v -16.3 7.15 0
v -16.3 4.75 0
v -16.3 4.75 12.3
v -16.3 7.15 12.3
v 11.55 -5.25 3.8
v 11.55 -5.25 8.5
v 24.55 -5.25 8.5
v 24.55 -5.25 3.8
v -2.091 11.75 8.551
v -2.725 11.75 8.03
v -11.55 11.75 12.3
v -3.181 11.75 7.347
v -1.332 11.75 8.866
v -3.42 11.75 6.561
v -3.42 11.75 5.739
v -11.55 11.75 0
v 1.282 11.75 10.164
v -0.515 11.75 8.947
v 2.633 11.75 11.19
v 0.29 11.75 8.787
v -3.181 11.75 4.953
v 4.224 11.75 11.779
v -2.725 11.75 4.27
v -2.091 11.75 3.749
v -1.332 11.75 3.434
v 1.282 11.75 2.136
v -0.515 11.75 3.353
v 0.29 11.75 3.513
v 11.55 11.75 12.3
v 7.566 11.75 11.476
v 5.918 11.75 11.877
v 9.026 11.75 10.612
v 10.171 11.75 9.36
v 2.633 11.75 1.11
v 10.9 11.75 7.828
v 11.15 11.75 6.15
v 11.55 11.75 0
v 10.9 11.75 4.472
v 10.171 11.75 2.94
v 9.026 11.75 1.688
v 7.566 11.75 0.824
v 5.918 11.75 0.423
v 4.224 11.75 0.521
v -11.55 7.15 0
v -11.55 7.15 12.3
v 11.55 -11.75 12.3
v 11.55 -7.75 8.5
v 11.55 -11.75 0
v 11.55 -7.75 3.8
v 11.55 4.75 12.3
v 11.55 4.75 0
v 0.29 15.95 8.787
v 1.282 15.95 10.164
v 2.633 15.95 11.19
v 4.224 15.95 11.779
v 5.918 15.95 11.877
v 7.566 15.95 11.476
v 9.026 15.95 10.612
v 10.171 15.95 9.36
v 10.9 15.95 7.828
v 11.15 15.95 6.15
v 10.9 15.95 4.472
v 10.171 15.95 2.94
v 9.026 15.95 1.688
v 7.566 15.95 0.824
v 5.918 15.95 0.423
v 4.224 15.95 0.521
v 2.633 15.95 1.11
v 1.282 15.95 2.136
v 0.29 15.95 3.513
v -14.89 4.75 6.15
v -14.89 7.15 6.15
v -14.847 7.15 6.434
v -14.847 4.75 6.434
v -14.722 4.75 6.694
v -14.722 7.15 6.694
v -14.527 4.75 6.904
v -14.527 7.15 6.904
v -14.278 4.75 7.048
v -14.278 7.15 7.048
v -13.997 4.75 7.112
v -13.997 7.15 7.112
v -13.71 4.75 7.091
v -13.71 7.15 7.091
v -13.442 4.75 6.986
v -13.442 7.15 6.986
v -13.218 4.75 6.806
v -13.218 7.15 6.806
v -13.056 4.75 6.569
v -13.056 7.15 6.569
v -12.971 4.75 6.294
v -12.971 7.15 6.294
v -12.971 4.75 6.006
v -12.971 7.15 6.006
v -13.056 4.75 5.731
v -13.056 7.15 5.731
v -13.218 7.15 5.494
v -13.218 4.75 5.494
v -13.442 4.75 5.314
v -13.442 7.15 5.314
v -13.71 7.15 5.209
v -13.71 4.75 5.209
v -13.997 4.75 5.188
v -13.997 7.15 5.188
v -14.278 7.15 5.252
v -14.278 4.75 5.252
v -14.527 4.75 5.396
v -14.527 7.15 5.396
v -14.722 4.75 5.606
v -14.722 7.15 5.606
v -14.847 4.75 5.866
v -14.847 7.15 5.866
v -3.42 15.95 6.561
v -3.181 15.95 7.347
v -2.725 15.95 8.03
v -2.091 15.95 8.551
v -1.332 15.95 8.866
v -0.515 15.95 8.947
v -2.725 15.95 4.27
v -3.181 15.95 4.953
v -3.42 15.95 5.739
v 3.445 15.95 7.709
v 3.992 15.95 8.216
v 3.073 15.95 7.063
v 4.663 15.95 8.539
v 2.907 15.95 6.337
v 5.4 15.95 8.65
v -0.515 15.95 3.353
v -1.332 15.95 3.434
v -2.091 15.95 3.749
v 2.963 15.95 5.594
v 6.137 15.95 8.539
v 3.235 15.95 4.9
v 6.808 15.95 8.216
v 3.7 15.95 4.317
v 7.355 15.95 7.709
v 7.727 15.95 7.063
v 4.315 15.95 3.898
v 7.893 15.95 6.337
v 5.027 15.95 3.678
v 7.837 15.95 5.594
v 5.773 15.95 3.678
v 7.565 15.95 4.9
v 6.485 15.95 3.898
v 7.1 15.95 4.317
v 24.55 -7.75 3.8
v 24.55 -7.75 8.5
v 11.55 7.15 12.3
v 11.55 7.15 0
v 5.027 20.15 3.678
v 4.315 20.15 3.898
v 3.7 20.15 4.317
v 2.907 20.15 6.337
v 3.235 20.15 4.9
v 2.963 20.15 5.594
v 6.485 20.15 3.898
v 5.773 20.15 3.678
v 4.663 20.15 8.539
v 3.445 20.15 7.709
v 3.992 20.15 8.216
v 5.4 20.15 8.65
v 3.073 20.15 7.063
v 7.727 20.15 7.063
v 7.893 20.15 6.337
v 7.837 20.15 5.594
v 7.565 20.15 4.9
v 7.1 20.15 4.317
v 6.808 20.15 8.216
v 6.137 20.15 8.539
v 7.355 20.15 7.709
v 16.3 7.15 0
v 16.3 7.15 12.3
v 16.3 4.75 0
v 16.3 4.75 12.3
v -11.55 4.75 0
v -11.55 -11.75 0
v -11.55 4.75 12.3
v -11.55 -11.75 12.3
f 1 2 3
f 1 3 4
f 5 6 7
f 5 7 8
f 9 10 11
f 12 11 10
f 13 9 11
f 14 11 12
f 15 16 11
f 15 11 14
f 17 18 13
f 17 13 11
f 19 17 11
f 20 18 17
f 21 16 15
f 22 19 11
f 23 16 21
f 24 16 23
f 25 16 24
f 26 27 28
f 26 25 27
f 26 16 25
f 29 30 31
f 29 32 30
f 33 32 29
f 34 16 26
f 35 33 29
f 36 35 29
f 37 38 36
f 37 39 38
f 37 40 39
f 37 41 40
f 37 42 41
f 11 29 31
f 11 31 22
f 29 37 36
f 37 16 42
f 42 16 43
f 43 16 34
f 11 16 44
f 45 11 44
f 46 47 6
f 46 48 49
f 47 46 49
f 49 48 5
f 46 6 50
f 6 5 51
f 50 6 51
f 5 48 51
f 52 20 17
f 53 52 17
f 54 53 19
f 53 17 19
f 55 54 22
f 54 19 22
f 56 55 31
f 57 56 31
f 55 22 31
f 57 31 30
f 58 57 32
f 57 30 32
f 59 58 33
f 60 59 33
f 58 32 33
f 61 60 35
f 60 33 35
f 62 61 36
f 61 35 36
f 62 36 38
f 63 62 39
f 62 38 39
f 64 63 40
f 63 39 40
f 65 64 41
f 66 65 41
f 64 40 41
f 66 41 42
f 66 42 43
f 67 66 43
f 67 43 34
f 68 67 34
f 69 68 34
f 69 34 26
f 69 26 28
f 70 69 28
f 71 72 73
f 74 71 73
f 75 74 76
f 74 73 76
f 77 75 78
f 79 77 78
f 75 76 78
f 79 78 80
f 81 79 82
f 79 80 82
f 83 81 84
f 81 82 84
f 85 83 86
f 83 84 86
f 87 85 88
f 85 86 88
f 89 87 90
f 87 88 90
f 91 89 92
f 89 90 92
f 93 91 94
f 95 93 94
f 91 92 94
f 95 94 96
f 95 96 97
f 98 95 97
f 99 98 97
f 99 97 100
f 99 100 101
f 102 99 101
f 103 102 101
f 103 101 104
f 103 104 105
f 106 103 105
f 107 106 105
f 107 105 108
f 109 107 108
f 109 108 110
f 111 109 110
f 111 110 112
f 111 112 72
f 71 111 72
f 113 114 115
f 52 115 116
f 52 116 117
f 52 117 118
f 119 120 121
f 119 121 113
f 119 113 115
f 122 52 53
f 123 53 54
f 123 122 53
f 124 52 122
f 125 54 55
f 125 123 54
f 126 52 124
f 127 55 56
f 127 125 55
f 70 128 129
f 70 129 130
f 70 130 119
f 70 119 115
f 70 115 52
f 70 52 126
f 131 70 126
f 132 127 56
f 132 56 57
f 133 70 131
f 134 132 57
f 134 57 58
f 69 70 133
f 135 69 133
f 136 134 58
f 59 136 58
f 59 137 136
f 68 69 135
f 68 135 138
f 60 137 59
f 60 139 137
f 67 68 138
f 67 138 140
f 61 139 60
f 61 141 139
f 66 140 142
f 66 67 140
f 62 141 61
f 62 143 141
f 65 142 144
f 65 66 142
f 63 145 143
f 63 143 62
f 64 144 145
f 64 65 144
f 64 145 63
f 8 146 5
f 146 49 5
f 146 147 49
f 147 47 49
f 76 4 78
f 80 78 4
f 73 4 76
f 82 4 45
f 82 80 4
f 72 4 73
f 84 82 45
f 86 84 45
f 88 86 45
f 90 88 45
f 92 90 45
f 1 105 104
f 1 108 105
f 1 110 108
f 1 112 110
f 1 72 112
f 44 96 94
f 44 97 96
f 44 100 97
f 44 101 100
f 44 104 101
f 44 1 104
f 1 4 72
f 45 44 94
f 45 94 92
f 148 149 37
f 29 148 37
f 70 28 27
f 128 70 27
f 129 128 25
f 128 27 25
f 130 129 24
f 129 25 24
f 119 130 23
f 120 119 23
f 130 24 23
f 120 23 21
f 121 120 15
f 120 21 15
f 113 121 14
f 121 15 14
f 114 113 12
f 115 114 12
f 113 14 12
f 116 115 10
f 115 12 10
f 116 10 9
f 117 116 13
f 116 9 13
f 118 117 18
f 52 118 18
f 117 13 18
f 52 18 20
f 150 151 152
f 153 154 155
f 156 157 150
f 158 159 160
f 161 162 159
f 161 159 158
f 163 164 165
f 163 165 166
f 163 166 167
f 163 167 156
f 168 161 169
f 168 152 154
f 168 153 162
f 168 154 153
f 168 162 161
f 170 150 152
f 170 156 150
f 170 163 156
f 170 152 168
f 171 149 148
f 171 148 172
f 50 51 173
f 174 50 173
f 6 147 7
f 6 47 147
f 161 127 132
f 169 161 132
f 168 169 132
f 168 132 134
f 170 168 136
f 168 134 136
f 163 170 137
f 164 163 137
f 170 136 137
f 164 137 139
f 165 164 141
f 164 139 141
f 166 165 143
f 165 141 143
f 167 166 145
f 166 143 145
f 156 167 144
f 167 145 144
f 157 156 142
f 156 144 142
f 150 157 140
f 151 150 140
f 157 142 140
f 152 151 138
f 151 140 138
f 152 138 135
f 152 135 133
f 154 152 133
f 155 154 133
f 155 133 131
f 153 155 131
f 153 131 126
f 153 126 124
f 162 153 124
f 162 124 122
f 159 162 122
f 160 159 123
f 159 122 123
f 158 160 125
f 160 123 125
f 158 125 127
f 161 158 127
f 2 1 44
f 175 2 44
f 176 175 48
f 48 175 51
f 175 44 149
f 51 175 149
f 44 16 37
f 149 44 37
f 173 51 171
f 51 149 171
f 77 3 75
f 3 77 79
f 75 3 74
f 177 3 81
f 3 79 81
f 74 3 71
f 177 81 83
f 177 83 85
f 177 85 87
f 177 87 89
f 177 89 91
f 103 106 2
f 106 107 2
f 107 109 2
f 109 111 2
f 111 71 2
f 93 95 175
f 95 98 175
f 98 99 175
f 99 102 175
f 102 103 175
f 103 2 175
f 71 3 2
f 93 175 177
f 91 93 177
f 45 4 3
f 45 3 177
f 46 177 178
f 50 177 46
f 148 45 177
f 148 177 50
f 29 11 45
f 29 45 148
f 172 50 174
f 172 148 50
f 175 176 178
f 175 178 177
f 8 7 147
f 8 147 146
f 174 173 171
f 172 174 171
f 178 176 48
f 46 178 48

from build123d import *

# Parameters (mm, degrees)
SKETCH_1_W          = 23.1
SKETCH_1_H          = 4.6
SKETCH_1_H_2        = 2.4
SKETCH_1_W_2        = 4.75
SKETCH_1_H_3        = 16.5
EXTRUDE_1_DEPTH     = 12.3
SKETCH_2_R          = 5.75
SKETCH_2_R_2        = 2.8
EXTRUDE_3_DEPTH     = 4.2
SKETCH_4_R          = 2.5
EXTRUDE_4_DEPTH     = 4.2
SKETCH_5_W          = 4.7
SKETCH_5_H          = 2.5
EXTRUDE_5_DEPTH     = 8
SKETCH_6_W          = 4.7
SKETCH_6_H          = 2.5
EXTRUDE_6_DEPTH     = 5
SKETCH_7_R          = 0.965
CUT_EXTRUDE_1_DEPTH = 7


with BuildPart() as part:
    # 草图1 → 凸台-拉伸1 (new body)
    with BuildSketch(Plane.XY):
        with Locations((0, 9.45)):
            Rectangle(SKETCH_1_W, SKETCH_1_H)
        with Locations((0, 5.95)):
            Rectangle(SKETCH_1_W, SKETCH_1_H_2)
        with Locations((-13.925, 5.95)):
            Rectangle(SKETCH_1_W_2, SKETCH_1_H_2)
        with Locations((13.925, 5.95)):
            Rectangle(SKETCH_1_W_2, SKETCH_1_H_2)
        with Locations((0, -3.5)):
            Rectangle(SKETCH_1_W, SKETCH_1_H_3)
    extrude(amount=EXTRUDE_1_DEPTH)

    # 草图2 → 凸台-拉伸3 (add)
    with BuildSketch(Plane(origin=(0, 11.75, 0), x_dir=(1, 0, 0), z_dir=(0, 1, 0))):
        with Locations((5.4, -6.15)):
            Circle(SKETCH_2_R)
        with Locations((-0.65, -6.15)):
            Circle(SKETCH_2_R_2)
        with Locations((-0.65, -6.15)):
            Circle(SKETCH_2_R_2)
        with Locations((5.4, -6.15)):
            Circle(SKETCH_2_R)
        with Locations((5.4, -6.15)):
            Circle(SKETCH_2_R)
        with Locations((-0.65, -6.15)):
            Circle(SKETCH_2_R_2)
    extrude(amount=EXTRUDE_3_DEPTH)

    # 草图4 → 凸台-拉伸4 (add)
    with BuildSketch(Plane(origin=(0, 15.95, 0), x_dir=(1, 0, 0), z_dir=(0, 1, 0))):
        with Locations(Location((5.4, -6.15, 0), (0, 0, 270))):
            Circle(SKETCH_4_R)
    extrude(amount=EXTRUDE_4_DEPTH)

    # 草图5 → 凸台-拉伸5 (add)
    with BuildSketch(Plane(origin=(11.55, 0, 0), x_dir=(0, 0, -1), z_dir=(1, 0, 0))):
        with Locations((-6.15, -6.5)):
            Rectangle(SKETCH_5_W, SKETCH_5_H)
    extrude(amount=EXTRUDE_5_DEPTH)

    # 草图6 → 凸台-拉伸6 (add)
    with BuildSketch(Plane(origin=(19.55, 0, 0), x_dir=(0, 0, -1), z_dir=(1, 0, 0))):
        with Locations((-6.15, -6.5)):
            Rectangle(SKETCH_6_W, SKETCH_6_H)
    extrude(amount=EXTRUDE_6_DEPTH)

    # 草图7 → 切除-拉伸1 (cut)
    with BuildSketch(Plane(origin=(0, 7.15, 0), x_dir=(1, 0, 0), z_dir=(0, 1, 0))):
        with Locations(Location((-13.925, -6.15, 0), (0, 0, 180))):
            Circle(SKETCH_7_R)
    extrude(amount=-CUT_EXTRUDE_1_DEPTH, mode=Mode.SUBTRACT)


solid = part.part
